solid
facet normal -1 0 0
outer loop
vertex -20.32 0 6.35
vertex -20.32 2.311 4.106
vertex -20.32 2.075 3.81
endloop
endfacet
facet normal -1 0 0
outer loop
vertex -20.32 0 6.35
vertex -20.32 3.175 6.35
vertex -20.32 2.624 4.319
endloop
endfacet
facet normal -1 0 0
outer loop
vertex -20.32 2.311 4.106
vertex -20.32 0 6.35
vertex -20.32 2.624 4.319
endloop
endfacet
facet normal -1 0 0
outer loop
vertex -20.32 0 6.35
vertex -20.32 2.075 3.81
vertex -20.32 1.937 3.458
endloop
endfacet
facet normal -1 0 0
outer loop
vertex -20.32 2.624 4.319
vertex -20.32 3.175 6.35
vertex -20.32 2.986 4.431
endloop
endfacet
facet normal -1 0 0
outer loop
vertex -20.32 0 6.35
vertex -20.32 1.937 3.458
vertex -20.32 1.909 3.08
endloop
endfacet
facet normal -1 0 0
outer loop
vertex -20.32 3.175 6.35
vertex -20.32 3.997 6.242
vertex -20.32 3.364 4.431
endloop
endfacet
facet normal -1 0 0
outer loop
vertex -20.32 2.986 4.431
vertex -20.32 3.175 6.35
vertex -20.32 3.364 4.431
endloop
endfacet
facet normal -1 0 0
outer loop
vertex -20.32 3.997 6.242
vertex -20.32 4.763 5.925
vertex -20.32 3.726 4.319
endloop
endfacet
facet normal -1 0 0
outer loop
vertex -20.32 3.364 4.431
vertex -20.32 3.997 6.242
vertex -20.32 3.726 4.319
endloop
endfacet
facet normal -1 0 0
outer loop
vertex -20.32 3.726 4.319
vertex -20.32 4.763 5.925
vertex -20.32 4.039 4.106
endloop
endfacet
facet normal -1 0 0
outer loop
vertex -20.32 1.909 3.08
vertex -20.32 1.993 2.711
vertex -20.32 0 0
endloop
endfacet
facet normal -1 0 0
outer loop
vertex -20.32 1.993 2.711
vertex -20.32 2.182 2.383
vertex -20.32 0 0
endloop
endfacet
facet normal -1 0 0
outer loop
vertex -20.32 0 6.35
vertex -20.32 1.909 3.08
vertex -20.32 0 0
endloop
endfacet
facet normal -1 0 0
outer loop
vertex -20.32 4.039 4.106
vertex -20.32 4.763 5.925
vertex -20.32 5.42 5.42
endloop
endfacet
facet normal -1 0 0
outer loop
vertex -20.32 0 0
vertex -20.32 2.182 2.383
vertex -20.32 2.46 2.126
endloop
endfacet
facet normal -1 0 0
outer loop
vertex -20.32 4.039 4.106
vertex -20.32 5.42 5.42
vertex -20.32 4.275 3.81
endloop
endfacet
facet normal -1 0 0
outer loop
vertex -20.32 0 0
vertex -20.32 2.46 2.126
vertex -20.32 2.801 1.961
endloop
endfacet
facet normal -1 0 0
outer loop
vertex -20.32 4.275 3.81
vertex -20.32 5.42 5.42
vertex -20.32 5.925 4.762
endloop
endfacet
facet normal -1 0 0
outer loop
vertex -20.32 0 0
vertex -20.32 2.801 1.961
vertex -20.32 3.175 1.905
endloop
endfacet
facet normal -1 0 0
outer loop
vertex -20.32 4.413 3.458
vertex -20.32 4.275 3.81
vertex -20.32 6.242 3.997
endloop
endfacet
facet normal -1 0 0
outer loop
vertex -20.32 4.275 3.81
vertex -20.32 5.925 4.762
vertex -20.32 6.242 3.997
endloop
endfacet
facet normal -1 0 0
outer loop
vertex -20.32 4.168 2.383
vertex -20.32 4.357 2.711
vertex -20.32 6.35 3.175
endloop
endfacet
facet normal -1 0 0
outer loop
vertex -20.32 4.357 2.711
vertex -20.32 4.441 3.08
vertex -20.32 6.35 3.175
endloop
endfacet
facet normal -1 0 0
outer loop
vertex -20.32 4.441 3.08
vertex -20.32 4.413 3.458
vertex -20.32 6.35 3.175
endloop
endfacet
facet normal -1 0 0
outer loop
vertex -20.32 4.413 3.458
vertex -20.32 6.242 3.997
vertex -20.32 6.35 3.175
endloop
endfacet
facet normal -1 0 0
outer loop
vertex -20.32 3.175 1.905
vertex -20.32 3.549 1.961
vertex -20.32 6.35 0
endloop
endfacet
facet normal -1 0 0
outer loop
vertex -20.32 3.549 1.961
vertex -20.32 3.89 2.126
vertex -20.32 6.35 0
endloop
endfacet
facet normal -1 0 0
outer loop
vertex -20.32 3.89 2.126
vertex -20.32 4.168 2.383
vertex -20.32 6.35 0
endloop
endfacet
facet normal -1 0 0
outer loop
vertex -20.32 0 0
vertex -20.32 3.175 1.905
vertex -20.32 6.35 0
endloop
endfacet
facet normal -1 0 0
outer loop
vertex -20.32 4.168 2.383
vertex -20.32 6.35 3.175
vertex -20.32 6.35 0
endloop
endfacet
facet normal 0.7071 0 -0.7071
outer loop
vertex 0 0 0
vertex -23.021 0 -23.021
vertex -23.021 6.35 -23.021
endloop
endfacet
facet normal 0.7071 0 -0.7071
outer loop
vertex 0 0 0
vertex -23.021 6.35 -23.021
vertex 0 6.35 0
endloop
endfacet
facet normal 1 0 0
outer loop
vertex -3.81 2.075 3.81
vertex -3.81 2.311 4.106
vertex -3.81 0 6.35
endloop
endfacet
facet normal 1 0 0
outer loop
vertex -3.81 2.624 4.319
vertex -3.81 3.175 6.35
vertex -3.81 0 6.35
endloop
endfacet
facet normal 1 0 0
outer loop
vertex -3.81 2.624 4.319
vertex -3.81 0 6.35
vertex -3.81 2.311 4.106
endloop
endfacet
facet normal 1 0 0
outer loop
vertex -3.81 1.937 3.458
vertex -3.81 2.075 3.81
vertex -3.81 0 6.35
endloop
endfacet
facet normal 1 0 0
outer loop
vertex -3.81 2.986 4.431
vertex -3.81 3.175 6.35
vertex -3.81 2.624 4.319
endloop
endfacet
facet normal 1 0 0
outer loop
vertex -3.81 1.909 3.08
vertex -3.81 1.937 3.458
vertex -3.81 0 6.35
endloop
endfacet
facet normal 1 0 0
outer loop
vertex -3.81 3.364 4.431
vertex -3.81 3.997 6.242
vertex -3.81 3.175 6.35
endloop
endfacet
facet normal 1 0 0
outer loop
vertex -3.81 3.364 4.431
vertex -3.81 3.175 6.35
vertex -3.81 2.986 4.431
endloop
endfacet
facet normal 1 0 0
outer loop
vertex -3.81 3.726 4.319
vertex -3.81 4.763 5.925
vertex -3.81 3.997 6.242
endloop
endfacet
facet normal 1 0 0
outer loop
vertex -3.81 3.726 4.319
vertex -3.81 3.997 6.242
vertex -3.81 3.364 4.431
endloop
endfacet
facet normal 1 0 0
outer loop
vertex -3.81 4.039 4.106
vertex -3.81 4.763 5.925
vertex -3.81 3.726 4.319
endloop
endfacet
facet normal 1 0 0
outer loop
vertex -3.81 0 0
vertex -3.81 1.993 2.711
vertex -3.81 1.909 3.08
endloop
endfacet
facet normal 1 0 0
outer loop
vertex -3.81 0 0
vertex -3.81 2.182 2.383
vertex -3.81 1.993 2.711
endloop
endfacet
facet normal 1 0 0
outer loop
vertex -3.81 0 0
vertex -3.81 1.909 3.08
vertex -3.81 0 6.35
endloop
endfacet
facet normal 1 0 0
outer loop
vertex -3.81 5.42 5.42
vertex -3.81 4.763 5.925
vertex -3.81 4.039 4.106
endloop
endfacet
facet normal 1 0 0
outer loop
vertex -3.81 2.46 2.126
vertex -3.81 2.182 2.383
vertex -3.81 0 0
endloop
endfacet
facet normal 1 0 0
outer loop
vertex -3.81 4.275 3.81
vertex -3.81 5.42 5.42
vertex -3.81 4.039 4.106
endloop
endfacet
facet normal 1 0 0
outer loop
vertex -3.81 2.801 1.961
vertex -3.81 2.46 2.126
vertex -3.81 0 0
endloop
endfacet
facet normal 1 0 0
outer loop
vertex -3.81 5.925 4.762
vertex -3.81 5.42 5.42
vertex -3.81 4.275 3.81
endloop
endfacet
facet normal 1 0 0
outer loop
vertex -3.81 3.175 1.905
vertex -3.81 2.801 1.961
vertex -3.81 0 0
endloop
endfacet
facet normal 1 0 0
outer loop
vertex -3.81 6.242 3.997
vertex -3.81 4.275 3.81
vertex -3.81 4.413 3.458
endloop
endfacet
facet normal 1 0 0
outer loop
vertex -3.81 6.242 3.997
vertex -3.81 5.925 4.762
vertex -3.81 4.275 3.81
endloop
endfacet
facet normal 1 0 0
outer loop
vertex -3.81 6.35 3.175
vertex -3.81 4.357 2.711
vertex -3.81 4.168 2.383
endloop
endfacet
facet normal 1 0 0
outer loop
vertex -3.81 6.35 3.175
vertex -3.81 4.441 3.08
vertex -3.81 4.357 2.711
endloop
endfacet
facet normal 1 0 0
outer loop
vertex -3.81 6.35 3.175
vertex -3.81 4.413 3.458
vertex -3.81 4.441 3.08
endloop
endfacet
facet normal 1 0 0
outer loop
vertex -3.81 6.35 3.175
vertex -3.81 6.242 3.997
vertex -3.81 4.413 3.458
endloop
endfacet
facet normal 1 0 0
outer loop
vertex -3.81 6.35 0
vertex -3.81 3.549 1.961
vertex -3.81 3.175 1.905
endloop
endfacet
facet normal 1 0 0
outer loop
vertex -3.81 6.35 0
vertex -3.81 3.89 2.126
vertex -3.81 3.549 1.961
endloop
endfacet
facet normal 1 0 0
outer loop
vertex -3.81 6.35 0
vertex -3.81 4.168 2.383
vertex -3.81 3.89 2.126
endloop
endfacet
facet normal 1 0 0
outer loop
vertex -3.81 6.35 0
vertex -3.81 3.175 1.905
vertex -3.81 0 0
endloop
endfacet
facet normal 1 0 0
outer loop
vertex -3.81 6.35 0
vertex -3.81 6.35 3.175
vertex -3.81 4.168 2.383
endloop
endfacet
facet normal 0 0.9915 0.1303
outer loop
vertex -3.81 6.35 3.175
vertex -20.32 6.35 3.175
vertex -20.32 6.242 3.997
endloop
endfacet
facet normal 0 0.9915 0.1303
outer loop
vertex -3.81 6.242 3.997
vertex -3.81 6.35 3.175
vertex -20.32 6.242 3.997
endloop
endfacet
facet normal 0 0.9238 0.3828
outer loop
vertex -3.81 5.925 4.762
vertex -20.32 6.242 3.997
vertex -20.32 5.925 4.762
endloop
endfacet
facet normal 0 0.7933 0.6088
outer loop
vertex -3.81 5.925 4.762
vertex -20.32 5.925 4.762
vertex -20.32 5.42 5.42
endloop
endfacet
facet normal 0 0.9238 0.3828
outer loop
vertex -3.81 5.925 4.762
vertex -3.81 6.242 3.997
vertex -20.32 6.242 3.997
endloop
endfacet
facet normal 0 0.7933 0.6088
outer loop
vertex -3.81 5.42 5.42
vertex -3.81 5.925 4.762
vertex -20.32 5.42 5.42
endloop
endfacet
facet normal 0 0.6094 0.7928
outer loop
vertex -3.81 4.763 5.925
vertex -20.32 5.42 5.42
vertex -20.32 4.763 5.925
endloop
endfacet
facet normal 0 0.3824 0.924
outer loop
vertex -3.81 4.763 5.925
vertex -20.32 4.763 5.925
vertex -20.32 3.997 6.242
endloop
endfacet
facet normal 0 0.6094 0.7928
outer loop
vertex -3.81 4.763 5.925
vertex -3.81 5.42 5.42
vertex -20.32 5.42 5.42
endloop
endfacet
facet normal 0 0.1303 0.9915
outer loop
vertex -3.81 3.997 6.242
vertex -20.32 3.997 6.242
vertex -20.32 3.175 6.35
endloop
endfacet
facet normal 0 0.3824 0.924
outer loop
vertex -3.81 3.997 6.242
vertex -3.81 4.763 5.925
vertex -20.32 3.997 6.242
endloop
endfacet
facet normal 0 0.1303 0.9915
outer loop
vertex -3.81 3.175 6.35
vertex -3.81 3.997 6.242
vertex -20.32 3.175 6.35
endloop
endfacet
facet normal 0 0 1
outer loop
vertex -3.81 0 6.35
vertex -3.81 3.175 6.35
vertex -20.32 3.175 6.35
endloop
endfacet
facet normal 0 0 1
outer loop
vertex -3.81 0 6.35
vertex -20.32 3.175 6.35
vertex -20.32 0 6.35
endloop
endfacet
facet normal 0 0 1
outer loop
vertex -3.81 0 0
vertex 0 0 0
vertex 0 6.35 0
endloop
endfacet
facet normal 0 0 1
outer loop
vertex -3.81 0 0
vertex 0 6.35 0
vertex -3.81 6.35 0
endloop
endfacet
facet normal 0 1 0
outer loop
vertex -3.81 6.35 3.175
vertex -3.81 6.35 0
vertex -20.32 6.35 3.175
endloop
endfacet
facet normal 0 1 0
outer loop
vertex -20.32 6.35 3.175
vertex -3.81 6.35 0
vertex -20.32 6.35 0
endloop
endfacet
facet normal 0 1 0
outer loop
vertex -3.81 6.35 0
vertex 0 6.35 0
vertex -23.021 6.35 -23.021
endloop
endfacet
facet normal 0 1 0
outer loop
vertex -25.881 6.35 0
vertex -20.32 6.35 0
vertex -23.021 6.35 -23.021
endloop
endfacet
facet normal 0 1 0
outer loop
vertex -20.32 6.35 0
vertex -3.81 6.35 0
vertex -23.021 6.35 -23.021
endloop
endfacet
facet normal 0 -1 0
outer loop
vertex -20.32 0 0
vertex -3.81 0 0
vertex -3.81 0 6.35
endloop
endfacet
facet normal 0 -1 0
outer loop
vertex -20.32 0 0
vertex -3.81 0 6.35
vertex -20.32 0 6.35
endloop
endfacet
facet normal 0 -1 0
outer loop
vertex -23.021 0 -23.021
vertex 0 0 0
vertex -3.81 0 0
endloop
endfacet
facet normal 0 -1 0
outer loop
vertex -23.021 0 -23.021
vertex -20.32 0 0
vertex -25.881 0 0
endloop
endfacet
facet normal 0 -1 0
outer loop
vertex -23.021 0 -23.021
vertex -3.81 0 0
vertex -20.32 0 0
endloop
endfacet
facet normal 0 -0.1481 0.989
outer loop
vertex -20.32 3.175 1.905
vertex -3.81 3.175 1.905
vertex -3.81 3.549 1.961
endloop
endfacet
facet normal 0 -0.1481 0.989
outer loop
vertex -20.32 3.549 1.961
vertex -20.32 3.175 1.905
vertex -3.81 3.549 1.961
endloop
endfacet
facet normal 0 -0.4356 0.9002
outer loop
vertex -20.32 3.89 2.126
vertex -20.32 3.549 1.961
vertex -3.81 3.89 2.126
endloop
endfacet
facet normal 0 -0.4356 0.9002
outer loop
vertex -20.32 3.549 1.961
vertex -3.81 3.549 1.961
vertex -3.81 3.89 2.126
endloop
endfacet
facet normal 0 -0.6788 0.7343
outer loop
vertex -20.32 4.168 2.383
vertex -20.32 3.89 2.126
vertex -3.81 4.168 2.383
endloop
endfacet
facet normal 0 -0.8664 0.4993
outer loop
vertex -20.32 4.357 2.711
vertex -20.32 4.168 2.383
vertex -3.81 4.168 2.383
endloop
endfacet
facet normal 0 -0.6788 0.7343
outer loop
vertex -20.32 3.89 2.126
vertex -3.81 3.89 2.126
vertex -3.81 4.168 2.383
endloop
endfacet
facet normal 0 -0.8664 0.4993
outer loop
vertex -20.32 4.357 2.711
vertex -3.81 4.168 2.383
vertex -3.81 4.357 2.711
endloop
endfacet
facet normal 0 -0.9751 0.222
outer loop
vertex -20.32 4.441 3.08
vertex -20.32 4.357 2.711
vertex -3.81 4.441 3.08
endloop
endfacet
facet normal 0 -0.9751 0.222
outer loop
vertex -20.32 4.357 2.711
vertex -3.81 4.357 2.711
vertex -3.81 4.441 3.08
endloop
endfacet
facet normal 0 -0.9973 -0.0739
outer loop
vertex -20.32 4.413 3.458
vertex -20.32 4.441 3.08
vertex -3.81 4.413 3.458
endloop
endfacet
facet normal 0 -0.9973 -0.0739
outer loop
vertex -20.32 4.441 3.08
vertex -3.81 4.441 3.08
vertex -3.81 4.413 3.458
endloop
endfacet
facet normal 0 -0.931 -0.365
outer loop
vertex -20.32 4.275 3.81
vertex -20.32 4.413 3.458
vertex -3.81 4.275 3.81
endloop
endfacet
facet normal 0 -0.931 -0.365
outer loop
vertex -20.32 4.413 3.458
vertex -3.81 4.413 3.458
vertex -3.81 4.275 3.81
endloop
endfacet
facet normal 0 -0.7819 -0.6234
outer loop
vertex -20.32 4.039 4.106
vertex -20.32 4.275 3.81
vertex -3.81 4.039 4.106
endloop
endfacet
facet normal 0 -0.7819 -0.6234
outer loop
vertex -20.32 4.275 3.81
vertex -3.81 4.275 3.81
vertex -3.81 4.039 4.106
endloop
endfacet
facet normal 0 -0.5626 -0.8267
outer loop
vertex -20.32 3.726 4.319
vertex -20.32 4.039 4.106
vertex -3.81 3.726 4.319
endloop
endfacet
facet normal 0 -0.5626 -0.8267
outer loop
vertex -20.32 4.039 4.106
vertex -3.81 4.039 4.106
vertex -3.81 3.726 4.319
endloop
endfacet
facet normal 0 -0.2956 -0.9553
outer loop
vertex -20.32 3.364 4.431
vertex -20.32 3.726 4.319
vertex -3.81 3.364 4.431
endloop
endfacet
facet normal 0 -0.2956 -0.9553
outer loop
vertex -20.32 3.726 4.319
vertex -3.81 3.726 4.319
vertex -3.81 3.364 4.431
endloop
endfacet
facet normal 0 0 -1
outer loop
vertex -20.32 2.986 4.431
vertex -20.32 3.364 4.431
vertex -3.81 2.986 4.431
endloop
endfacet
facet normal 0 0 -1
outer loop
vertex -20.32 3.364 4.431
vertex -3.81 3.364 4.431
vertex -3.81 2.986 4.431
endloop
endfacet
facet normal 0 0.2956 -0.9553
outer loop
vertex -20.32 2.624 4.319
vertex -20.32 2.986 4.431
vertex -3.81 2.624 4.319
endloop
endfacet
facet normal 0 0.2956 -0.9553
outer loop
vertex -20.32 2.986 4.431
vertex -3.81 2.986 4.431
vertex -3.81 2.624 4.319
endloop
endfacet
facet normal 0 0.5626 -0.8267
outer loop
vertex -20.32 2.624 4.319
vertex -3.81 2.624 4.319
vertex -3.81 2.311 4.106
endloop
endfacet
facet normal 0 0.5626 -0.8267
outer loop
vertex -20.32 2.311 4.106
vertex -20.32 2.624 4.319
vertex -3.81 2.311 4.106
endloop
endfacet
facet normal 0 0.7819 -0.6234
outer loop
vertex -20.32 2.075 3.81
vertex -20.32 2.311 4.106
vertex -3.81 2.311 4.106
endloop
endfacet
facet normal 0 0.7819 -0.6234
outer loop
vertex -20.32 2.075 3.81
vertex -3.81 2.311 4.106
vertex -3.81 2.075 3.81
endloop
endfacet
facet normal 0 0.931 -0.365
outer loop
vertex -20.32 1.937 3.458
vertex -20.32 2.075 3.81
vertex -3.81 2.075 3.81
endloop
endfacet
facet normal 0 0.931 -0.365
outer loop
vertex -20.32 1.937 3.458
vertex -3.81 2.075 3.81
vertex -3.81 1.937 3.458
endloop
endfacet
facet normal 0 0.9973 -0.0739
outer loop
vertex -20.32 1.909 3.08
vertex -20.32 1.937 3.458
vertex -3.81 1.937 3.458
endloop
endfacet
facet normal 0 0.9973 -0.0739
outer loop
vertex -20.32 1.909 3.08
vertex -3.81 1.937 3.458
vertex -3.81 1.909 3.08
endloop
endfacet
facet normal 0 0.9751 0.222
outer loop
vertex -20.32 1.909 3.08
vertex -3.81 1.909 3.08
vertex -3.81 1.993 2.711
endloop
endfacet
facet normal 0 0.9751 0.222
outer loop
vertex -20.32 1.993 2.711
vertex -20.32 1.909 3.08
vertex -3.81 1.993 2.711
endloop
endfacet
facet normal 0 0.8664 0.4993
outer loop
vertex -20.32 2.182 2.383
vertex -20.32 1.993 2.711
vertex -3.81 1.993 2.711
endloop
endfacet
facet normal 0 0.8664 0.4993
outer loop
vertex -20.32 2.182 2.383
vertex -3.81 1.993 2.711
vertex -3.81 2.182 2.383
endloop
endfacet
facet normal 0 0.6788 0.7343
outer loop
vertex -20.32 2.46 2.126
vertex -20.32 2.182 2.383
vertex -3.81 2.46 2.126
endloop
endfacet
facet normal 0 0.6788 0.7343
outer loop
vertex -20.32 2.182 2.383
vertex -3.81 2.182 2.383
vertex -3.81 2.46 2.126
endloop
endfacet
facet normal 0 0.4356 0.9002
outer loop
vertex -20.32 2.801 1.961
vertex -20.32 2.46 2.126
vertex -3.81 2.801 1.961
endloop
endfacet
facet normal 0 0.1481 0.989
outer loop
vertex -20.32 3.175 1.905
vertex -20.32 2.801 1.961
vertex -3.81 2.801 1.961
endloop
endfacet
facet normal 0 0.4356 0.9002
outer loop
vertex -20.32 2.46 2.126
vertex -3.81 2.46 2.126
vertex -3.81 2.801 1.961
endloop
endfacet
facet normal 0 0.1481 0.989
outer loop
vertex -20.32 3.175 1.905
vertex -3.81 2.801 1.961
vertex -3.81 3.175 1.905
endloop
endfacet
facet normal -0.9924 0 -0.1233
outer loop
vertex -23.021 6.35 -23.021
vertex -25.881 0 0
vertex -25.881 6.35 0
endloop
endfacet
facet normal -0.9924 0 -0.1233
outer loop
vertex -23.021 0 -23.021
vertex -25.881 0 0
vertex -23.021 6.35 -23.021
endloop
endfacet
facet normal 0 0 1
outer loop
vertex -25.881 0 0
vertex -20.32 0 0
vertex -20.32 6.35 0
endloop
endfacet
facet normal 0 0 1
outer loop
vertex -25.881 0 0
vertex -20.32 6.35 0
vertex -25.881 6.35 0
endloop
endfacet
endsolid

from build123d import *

# Parameters (mm, degrees)
BOSS_EXTRUDE1_DEPTH = 6.35
BOSS_EXTRUDE2_START = -3.81
SKETCH2_R           = 3.175
SKETCH2_R_2         = 1.27
BOSS_EXTRUDE2_DEPTH = 16.51


with BuildPart() as part:
    # Sketch1 → Boss-Extrude1 (new body)
    with BuildSketch(Plane(origin=(0, 0, 0), x_dir=(1, 0, 0), z_dir=(0, 1, 0))):
        Polygon((-25.881030621, 0), (-23.020766125, 23.020766125), (0, 0), align=None)
    extrude(amount=BOSS_EXTRUDE1_DEPTH)

    # Sketch2 → Boss-Extrude2 (add)
    with BuildSketch(Plane(origin=(0, 0, 0), x_dir=(0, 0, -1), z_dir=(1, 0, 0)).offset(BOSS_EXTRUDE2_START)):
        with Locations((-3.175, 3.175)):
            Circle(SKETCH2_R)
        with Locations((-3.175, 3.175)):
            Circle(SKETCH2_R_2, mode=Mode.SUBTRACT)
        with BuildLine():
            ThreePointArc((-3.174999994, 6.35), (-0.929935968, 5.420064028), (0, 3.175))
            Line((0, 3.175), (0, 6.35))
            Line((0, 6.35), (-3.174999994, 6.35))
        make_face()
        with BuildLine():
            ThreePointArc((0, 3.175), (-0.92993597, 0.92993597), (-3.175, 0))
            Line((-3.175, 0), (0, 0))
            Line((0, 0), (0, 3.175))
        make_face()
        with BuildLine():
            Line((-6.35, 3.175), (-6.35, 0))
            Line((-6.35, 0), (-3.175, 0))
            ThreePointArc((-3.175, 0), (-5.42006403, 0.92993597), (-6.35, 3.175))
        make_face()
    extrude(amount=-BOSS_EXTRUDE2_DEPTH)


solid = part.part
